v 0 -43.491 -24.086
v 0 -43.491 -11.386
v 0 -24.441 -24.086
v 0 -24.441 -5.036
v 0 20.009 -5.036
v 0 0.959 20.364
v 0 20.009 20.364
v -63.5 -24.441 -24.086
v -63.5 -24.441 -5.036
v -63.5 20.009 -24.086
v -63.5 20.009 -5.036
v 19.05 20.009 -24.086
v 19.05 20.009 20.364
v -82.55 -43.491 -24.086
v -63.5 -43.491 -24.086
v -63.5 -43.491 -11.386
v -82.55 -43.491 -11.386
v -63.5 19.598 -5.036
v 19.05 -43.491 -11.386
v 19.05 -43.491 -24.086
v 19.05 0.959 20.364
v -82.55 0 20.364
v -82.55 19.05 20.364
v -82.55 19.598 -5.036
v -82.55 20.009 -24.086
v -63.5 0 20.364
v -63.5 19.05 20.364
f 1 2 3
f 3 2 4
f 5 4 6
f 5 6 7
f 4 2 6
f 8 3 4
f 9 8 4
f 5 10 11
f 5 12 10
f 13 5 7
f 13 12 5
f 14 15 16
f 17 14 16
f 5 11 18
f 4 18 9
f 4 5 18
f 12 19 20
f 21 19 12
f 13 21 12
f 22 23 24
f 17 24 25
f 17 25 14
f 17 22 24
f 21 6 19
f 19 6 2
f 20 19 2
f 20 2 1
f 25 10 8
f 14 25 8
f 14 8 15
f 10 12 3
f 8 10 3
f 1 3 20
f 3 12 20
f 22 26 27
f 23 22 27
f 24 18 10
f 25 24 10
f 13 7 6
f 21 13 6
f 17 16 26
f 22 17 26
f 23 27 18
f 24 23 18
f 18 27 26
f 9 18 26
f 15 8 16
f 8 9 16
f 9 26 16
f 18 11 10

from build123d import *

# Parameters (mm, degrees)
F1_DEPTH = 19.05
F2_W     = 44.45
F2_H     = 19.05
F3_DEPTH = 63.5
F5_DEPTH = 19.05


with BuildPart() as f1:
    # F0 (on Right) → F1 (new body)
    with BuildSketch(Plane.YZ):
        Polygon((0.958807, 20.364464), (-43.491193, -11.385536), (-43.491193, -24.085536), (20.008807, -24.085536), (20.008807, 20.364464), align=None)
    extrude(amount=F1_DEPTH)

    # F2 (on face) → F3 (join)
    with BuildSketch(Plane(origin=(0, 0, 0), x_dir=(0, -1, 0), z_dir=(-1, 0, 0))):
        with Locations((2.216193, -14.560536)):
            Rectangle(F2_W, F2_H)
    extrude(amount=F3_DEPTH)

    # F4 (on face) → F5 (join)
    with BuildSketch(Plane(origin=(-63.5, 0, 0), x_dir=(0, -1, 0), z_dir=(-1, 0, 0))):
        Polygon((24.441193, -5.035536), (24.441193, -24.085536), (43.491193, -24.085536), (43.491193, -11.385536), (0, 20.364464), (-19.05, 20.364464), (-19.59789, -5.035536), align=None)
        Polygon((-19.59789, -5.035536), (-20.008807, -24.085536), (24.441193, -24.085536), (24.441193, -5.035536), align=None)
    extrude(amount=F5_DEPTH)


solid = f1.part
